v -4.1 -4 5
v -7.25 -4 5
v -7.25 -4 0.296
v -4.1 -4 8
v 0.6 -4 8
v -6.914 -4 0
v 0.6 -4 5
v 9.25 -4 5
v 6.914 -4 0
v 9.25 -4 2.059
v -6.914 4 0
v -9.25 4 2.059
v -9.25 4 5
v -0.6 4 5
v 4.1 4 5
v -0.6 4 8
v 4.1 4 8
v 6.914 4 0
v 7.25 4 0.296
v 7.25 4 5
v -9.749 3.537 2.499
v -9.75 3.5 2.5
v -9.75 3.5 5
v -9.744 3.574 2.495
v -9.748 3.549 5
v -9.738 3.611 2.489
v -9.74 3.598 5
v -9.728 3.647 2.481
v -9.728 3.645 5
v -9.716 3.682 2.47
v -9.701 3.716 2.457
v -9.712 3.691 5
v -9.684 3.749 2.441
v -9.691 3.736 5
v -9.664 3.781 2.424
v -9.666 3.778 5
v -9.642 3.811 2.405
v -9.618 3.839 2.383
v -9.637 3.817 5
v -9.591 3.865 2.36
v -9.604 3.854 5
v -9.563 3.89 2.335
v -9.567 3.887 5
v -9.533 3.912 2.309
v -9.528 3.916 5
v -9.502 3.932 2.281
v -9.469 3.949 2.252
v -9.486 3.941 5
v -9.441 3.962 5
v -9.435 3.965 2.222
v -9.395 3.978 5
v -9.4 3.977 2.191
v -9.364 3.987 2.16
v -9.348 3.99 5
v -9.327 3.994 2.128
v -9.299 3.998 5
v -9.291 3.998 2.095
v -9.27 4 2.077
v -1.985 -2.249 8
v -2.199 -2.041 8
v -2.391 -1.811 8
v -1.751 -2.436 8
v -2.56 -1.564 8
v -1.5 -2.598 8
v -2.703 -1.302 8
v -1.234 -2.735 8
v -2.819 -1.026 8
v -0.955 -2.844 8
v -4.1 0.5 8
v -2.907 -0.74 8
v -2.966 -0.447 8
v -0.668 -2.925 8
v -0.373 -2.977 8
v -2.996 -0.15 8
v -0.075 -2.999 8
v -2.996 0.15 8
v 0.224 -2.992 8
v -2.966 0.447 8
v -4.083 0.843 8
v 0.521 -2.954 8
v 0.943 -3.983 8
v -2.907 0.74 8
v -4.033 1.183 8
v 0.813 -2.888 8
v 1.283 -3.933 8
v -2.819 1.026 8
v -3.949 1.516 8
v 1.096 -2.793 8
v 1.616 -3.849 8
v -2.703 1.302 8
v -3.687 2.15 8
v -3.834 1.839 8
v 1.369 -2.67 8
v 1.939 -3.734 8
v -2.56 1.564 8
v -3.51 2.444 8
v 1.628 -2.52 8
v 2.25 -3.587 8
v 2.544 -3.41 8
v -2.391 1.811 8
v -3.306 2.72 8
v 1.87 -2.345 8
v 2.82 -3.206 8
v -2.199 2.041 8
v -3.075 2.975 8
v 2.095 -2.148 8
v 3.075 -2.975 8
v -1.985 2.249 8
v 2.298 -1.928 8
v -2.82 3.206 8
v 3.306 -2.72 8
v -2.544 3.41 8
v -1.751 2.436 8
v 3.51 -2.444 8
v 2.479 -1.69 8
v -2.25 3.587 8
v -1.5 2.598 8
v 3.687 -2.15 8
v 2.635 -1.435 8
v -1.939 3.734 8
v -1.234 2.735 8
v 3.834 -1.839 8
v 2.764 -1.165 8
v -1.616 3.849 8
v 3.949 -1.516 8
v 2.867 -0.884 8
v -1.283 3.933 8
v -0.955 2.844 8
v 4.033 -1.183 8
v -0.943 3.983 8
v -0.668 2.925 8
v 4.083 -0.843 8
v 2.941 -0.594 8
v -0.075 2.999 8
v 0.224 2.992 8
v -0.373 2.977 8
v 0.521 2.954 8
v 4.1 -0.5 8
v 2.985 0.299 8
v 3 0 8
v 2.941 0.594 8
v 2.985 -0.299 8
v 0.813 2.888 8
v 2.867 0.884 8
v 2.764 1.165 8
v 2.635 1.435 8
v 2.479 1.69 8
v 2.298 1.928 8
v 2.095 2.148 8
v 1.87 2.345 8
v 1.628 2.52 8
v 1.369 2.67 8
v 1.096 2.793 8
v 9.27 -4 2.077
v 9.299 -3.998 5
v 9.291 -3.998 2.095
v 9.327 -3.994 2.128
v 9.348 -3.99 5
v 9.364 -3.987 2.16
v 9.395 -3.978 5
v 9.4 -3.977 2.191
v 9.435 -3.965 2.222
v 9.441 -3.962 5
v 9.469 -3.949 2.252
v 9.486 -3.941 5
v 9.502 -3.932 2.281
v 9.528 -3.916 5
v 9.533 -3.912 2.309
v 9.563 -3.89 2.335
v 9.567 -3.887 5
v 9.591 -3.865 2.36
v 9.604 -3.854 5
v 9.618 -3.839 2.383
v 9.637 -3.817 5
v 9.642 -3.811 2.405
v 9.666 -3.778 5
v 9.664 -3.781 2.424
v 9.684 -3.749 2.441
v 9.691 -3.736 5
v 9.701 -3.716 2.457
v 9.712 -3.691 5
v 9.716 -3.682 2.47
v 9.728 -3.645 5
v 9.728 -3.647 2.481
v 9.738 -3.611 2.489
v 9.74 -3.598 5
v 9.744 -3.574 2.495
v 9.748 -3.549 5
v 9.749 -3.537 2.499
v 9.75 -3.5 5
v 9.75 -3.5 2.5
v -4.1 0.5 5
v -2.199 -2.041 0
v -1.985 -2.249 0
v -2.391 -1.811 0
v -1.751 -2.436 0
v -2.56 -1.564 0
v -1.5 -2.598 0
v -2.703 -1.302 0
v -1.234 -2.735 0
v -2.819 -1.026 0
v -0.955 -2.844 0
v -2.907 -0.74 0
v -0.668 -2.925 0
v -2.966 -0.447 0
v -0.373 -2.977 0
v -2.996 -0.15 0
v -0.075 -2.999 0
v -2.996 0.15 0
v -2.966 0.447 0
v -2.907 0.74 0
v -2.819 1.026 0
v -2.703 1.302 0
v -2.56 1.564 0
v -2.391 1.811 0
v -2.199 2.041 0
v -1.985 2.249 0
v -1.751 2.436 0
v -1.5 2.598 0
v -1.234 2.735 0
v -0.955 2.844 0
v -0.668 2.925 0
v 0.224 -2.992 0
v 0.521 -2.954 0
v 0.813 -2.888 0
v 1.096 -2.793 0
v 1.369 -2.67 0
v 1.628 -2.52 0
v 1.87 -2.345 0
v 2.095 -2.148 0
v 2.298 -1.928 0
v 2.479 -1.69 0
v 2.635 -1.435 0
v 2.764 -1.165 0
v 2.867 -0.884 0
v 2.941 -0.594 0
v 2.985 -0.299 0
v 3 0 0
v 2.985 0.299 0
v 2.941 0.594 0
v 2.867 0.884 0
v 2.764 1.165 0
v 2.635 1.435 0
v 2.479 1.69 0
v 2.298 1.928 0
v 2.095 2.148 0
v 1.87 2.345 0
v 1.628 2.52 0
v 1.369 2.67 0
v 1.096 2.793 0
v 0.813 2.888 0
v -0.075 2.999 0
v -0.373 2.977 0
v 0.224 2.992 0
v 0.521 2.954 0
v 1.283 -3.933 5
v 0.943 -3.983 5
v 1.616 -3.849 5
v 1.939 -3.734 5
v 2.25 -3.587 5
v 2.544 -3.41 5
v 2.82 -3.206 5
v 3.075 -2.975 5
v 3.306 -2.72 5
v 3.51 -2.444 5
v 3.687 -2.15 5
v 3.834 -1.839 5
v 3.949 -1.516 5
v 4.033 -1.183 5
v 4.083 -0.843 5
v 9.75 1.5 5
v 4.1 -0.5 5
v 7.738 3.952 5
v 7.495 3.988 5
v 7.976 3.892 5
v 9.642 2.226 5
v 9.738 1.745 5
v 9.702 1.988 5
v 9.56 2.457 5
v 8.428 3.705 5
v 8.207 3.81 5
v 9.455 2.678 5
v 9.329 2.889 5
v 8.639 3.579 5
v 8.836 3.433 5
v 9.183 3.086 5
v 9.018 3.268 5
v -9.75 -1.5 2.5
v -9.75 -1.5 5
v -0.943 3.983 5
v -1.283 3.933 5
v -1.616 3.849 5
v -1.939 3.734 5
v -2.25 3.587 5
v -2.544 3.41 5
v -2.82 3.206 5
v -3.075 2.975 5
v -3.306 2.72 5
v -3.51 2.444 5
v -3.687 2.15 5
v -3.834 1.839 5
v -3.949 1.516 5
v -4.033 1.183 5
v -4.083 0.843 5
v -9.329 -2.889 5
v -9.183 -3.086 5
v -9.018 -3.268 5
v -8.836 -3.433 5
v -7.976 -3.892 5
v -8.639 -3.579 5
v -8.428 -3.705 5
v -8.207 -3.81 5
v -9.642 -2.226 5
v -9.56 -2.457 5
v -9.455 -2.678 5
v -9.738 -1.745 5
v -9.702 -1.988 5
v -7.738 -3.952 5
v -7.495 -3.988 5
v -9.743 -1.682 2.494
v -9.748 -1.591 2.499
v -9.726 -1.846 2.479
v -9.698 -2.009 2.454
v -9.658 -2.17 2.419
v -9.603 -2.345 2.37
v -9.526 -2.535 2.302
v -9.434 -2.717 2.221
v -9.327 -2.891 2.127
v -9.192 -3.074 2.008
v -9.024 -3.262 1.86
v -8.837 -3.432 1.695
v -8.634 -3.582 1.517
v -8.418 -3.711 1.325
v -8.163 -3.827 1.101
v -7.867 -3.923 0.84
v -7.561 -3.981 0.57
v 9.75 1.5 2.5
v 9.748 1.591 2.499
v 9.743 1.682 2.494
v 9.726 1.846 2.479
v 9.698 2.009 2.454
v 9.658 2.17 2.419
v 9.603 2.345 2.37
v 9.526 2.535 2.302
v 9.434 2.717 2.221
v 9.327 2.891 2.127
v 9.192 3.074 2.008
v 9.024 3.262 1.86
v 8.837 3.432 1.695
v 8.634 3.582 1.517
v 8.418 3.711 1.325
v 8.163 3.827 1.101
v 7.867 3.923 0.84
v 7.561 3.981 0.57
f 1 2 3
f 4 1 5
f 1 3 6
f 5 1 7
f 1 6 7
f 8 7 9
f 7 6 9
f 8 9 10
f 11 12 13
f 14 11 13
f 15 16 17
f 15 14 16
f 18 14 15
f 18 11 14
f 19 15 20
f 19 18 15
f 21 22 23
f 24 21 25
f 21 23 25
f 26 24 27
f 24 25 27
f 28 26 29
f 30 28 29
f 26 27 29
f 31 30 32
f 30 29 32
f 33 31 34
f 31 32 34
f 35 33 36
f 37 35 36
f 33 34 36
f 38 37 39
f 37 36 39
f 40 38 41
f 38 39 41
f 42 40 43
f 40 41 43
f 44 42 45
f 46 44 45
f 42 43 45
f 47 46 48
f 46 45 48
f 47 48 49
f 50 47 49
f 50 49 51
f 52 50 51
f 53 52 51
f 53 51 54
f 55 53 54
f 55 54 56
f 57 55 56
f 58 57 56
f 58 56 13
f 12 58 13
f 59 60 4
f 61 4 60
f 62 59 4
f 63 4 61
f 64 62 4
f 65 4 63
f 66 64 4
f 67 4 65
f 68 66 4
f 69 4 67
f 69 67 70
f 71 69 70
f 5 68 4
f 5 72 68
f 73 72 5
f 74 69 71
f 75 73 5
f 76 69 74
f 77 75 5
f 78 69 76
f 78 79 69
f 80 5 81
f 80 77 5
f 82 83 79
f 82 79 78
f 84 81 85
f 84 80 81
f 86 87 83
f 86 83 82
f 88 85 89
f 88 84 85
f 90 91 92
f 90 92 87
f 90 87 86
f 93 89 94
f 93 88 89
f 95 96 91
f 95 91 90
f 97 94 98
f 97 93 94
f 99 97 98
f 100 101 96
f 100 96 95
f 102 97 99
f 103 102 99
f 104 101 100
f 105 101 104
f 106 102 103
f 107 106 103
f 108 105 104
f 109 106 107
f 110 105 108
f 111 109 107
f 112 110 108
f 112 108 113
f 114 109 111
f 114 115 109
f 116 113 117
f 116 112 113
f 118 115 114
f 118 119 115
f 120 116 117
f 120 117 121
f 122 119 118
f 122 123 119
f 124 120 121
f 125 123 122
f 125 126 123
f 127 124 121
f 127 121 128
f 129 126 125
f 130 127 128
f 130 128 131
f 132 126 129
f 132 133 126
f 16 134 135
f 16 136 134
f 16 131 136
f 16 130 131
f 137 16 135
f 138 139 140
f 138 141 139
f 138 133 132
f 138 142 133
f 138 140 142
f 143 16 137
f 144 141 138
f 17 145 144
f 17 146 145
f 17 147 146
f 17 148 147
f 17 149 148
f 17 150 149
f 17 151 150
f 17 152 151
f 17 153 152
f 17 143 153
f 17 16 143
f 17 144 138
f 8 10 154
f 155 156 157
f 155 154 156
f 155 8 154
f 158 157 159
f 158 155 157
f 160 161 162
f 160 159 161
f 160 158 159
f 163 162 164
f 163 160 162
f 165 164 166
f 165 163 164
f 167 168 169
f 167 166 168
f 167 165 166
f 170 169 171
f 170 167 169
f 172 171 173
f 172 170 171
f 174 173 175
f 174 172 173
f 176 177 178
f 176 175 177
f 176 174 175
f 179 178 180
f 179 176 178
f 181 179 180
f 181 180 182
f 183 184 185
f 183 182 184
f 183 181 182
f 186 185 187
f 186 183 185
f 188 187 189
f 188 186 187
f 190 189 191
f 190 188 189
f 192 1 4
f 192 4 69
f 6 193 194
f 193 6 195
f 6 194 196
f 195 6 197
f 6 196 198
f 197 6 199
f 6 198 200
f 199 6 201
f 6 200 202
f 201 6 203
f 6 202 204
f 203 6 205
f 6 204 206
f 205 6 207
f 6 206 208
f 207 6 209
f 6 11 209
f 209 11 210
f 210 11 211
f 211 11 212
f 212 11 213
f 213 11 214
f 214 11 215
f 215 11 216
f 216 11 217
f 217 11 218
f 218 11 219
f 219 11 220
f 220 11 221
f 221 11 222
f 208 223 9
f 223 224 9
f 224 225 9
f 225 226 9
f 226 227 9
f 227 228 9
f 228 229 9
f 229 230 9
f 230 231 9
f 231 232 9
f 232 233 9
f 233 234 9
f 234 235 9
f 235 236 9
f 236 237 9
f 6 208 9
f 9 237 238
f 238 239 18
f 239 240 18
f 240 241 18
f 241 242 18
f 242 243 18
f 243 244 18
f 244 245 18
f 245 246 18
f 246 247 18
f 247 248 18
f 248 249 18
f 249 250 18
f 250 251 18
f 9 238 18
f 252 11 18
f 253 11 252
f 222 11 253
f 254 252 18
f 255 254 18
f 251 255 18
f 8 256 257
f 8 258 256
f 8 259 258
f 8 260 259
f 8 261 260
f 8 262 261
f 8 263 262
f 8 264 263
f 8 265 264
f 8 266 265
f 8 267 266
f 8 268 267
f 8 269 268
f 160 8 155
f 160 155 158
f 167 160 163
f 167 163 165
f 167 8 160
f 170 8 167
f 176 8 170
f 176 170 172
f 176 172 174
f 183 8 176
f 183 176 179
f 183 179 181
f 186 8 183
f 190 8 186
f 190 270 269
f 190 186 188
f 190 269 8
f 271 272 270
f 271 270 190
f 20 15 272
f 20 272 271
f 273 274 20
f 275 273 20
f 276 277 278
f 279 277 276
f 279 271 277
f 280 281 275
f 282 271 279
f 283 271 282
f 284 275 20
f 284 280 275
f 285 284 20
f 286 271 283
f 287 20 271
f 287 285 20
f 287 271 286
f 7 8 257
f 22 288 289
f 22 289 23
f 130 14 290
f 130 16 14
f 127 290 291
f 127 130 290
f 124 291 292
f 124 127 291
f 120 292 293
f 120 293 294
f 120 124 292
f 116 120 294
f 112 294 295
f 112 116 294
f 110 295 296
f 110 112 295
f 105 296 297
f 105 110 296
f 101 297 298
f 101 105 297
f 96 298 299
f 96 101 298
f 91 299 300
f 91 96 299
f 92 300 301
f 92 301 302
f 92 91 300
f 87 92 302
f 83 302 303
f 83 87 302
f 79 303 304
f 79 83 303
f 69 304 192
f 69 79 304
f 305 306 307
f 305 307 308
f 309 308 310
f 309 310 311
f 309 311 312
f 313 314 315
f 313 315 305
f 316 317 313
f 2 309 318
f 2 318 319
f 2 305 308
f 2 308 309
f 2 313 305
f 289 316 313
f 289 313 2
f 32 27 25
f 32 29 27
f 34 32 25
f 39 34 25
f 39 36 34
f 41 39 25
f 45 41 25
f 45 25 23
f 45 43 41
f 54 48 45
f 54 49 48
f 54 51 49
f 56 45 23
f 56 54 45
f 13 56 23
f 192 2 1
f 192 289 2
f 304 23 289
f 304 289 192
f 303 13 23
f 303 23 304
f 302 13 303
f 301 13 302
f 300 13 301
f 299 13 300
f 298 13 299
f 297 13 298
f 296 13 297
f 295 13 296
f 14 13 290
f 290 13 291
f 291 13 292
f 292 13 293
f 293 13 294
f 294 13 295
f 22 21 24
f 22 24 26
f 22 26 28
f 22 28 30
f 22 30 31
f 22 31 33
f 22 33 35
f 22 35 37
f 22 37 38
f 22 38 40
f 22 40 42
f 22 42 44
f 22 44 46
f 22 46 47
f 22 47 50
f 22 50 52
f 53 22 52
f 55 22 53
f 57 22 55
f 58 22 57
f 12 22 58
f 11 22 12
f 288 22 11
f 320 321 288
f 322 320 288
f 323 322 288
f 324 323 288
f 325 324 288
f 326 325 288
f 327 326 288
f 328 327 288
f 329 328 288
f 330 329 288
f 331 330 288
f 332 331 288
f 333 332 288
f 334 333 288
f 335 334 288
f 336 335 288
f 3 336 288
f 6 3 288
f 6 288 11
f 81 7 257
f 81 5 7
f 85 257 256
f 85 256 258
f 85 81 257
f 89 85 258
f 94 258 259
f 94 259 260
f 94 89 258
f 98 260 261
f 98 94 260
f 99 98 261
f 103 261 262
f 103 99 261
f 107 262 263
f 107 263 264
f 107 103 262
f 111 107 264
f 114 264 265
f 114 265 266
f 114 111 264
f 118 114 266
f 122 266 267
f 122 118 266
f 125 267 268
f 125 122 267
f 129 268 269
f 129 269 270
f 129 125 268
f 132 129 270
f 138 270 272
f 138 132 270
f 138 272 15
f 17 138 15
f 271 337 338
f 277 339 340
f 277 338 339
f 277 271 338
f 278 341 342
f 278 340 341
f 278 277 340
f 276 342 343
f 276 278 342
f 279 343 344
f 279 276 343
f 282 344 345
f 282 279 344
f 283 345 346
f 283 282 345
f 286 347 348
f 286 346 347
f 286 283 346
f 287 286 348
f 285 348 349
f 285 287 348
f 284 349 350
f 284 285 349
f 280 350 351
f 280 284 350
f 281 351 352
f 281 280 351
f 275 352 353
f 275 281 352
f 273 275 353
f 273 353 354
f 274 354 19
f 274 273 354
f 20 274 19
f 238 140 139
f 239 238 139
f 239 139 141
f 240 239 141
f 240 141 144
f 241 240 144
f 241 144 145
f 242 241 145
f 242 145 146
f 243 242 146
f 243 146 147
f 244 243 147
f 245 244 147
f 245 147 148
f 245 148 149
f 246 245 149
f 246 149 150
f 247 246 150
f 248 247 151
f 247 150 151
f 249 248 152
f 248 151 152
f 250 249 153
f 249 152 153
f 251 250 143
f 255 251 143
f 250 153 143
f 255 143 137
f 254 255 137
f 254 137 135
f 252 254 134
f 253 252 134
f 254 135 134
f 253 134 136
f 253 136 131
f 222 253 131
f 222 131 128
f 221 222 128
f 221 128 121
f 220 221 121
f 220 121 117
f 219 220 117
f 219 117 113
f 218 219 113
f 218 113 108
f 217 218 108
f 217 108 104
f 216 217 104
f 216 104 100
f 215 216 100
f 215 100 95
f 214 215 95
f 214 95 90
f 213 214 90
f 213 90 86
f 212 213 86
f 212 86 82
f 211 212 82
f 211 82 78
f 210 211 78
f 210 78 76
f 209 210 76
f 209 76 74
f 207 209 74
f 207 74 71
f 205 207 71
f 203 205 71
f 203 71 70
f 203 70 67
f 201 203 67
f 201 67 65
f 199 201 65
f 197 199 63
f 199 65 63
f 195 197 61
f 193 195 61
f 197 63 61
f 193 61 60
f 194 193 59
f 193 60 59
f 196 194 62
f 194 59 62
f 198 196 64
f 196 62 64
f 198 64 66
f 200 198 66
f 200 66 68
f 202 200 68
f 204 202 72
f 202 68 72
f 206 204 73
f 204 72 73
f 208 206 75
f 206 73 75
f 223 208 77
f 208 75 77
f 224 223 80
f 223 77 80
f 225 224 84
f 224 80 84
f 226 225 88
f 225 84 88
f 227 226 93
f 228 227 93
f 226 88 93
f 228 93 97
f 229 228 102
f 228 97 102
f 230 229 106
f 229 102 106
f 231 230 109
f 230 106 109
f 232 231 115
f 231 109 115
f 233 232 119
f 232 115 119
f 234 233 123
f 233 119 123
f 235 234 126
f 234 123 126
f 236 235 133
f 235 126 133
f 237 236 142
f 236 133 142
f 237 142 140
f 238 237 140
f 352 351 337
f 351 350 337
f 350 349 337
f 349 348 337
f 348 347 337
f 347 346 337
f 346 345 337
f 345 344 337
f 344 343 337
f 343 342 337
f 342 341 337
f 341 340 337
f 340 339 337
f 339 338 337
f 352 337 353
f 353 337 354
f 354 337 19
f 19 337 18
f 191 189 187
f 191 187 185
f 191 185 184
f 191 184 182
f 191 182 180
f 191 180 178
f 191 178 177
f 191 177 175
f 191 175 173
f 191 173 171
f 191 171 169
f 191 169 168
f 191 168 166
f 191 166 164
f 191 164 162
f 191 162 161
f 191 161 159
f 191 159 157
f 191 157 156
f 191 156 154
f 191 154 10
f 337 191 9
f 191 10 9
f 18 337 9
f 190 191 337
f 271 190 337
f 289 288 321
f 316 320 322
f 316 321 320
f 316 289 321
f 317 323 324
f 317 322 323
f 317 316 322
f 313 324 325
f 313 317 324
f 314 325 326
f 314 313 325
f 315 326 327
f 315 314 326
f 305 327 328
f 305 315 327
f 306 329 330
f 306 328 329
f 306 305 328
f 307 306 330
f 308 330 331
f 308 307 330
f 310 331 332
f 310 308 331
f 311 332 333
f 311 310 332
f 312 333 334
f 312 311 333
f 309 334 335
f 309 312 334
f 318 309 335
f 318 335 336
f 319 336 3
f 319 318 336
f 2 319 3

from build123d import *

# Parameters (mm, degrees)
SKETCH_1_W          = 19.5
SKETCH_1_H          = 8
EXTRUDE_1_DEPTH     = 5
FILLET_1_R          = 2.5
FILLET_2_R          = 0.5
CUT_EXTRUDE_2_DEPTH = 14.566963551
SKETCH_3_W          = 8.2
SKETCH_3_H          = 8
EXTRUDE_2_DEPTH     = 3
FILLET_3_R          = 3.5
SKETCH_4_R          = 3
CUT_EXTRUDE_3_DEPTH = 14.231118622


with BuildPart() as part:
    # 草图1 → 凸台-拉伸1 (new body)
    with BuildSketch(Plane.XY):
        Rectangle(SKETCH_1_W, SKETCH_1_H)
    extrude(amount=EXTRUDE_1_DEPTH)

    # 圆角1
    fillet_1_edges = [part.edges().sort_by_distance(p)[0] for p in [
        (-9.75, -4, 2.5),
        (9.75, 4, 2.5),
    ]]
    fillet(fillet_1_edges, radius=FILLET_1_R)

    # 圆角2
    fillet_2_edges = [part.edges().sort_by_distance(p)[0] for p in [
        (9.75, -4, 2.5),
        (-9.75, 4, 2.5),
    ]]
    fillet(fillet_2_edges, radius=FILLET_2_R)

    # 草图2 → 切除-拉伸2 (cut, through all)
    with BuildSketch(Plane.XZ.offset(4)):
        Polygon((-9.75, 2.5), (-6.914115374, 0), (-9.75, 0), align=None)
    cut_extrude_2 = extrude(amount=-CUT_EXTRUDE_2_DEPTH, mode=Mode.SUBTRACT)

    # 镜向1: 切除-拉伸2 across plane
    add(cut_extrude_2.mirror(Plane(origin=(0, 0, 0), x_dir=(0, 0, 1), z_dir=(1, 0, 0))), mode=Mode.SUBTRACT)

    # 草图3 → 凸台-拉伸2 (add)
    with BuildSketch(Plane.XY.offset(5)):
        Rectangle(SKETCH_3_W, SKETCH_3_H)
    extrude(amount=EXTRUDE_2_DEPTH)

    # 圆角3
    fillet_3_edges = [part.edges().sort_by_distance(p)[0] for p in [
        (4.1, -4, 6.5),
        (-4.1, 4, 6.5),
    ]]
    fillet(fillet_3_edges, radius=FILLET_3_R)

    # 草图4 → 切除-拉伸3 (cut, through all)
    with BuildSketch(Plane.XY.offset(8)):
        Circle(SKETCH_4_R)
    extrude(amount=-CUT_EXTRUDE_3_DEPTH, mode=Mode.SUBTRACT)


solid = part.part
